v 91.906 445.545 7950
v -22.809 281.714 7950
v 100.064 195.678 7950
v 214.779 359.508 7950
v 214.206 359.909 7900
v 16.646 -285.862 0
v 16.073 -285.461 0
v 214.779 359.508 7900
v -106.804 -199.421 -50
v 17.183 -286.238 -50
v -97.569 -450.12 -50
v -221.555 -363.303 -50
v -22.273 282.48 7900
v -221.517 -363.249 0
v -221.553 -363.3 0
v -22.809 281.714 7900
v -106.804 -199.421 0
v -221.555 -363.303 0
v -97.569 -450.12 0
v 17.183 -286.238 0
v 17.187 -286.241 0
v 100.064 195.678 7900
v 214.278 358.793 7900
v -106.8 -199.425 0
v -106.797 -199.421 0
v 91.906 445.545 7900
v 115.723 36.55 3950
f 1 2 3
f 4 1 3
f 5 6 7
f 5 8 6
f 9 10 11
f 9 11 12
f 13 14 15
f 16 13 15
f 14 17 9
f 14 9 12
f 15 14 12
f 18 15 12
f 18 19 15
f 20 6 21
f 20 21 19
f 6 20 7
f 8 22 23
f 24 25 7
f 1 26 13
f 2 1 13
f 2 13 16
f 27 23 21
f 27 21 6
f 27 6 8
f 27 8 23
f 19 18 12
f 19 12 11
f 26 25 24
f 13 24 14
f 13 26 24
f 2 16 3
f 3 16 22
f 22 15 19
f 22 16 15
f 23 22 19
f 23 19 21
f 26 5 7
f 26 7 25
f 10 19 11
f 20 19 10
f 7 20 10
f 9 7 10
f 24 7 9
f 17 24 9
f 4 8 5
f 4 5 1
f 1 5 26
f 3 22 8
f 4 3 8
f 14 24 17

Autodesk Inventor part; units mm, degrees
ref_plane "YZ Plane" through (0, 0, 0) normal (1, 0, 0) x (0, 1, 0)
ref_plane "XZ Plane" through (0, 0, 0) normal (0, 1, 0) x (-1, 0, 0)
sketch "Sketch1" plane through (0, 0, 0) normal (0, 0, 1) x (1, 0, 0)
  line L0 (-106.7972, -199.4212) -> (-221.5168, -363.2486)
  line L1 (16.0733, -285.461) -> (-106.7972, -199.4212)
  line L2 (16.6111, -285.8734) -> (-98.1042, -449.7038)
  line L3 (-98.1042, -449.7038) -> (-220.977, -363.6673)
  line L4 (-97.5688, -450.1195) -> (17.1869, -286.2407)
  line L5 (17.1869, -286.2407) -> (-106.7972, -199.4212)
  line L6 (-106.7972, -199.4212) -> (-221.5529, -363.3)
  line L7 (-221.5529, -363.3) -> (-97.5688, -450.1195)
  line L8 (-97.5688, -450.1195) -> (-106.7972, -199.4212) construction
  line L9 (17.1869, -286.2407) -> (-221.5529, -363.3) construction
  point P0 (0, 0)
  point P1 (-102.183, -324.7704)
ref_plane "Work Plane2" through (0, 0, 7900) normal (0, 0, 1) x (1, 0, 0)
ref_plane "Work Plane1" through (0, 0, 0) normal (0, 0, 1) x (1, 0, 0)
sketch "Sketch2" plane through (0, 0, 7900) normal (0, 0, 1) x (1, 0, 0)
  line L0 (214.7789, 359.5081) -> (91.9061, 445.5446) construction
  line L1 (91.9061, 445.5446) -> (-22.8092, 281.7142) construction
  line L2 (100.0636, 195.6777) -> (214.7789, 359.5081) construction
  line L3 (-22.8092, 281.7142) -> (100.0636, 195.6777) construction
  line L4 (100.0636, 195.6777) -> (214.7789, 359.5081)
  line L5 (214.7789, 359.5081) -> (91.9061, 445.5446)
  line L6 (91.9061, 445.5446) -> (-22.8092, 281.7142)
  line L7 (-22.8092, 281.7142) -> (100.0636, 195.6777)
  line L8 (100.0636, 195.6777) -> (91.9061, 445.5446) construction
  line L9 (214.7789, 359.5081) -> (-22.8092, 281.7142) construction
  point P0 (0, 0)
  point P1 (95.9849, 320.6112)
loft "Loft1" add profiles "Sketch1", "Sketch2"
sketch "Sketch3" plane through (-97.5688, -450.1195, 0) normal (0, 0, -1) x (-0.8191, 0.5736, 0)
  line L0 (0, 0) -> (0, 200.0628) projected
  line L1 (151.3594, 0) -> (0, 0) projected
  line L2 (151.3594, 200.0628) -> (151.3594, 0) projected
  line L3 (0, 200.0628) -> (151.3594, 200.0628) projected
  point P0 (178.2656, 424.6747)
sketch "Sketch4" plane through (100.0636, 195.6777, 7900) normal (0, 0, 1) x (0.8192, -0.5736, 0)
  line L0 (0, 0) -> (0, 200) projected
  line L1 (0, 200) -> (-150, 200) projected
  line L2 (-150, 200) -> (-150, 0) projected
  line L3 (-150, 0) -> (0, 0) projected
  point P0 (30.2688, -217.684)
extrude "Extrusion1" add sketch "Sketch3" along normal blind 50
extrude "Extrusion2" add sketch "Sketch4" along normal blind 50
properties part number "support_beam_segment_0104" material "Wood Shake"
